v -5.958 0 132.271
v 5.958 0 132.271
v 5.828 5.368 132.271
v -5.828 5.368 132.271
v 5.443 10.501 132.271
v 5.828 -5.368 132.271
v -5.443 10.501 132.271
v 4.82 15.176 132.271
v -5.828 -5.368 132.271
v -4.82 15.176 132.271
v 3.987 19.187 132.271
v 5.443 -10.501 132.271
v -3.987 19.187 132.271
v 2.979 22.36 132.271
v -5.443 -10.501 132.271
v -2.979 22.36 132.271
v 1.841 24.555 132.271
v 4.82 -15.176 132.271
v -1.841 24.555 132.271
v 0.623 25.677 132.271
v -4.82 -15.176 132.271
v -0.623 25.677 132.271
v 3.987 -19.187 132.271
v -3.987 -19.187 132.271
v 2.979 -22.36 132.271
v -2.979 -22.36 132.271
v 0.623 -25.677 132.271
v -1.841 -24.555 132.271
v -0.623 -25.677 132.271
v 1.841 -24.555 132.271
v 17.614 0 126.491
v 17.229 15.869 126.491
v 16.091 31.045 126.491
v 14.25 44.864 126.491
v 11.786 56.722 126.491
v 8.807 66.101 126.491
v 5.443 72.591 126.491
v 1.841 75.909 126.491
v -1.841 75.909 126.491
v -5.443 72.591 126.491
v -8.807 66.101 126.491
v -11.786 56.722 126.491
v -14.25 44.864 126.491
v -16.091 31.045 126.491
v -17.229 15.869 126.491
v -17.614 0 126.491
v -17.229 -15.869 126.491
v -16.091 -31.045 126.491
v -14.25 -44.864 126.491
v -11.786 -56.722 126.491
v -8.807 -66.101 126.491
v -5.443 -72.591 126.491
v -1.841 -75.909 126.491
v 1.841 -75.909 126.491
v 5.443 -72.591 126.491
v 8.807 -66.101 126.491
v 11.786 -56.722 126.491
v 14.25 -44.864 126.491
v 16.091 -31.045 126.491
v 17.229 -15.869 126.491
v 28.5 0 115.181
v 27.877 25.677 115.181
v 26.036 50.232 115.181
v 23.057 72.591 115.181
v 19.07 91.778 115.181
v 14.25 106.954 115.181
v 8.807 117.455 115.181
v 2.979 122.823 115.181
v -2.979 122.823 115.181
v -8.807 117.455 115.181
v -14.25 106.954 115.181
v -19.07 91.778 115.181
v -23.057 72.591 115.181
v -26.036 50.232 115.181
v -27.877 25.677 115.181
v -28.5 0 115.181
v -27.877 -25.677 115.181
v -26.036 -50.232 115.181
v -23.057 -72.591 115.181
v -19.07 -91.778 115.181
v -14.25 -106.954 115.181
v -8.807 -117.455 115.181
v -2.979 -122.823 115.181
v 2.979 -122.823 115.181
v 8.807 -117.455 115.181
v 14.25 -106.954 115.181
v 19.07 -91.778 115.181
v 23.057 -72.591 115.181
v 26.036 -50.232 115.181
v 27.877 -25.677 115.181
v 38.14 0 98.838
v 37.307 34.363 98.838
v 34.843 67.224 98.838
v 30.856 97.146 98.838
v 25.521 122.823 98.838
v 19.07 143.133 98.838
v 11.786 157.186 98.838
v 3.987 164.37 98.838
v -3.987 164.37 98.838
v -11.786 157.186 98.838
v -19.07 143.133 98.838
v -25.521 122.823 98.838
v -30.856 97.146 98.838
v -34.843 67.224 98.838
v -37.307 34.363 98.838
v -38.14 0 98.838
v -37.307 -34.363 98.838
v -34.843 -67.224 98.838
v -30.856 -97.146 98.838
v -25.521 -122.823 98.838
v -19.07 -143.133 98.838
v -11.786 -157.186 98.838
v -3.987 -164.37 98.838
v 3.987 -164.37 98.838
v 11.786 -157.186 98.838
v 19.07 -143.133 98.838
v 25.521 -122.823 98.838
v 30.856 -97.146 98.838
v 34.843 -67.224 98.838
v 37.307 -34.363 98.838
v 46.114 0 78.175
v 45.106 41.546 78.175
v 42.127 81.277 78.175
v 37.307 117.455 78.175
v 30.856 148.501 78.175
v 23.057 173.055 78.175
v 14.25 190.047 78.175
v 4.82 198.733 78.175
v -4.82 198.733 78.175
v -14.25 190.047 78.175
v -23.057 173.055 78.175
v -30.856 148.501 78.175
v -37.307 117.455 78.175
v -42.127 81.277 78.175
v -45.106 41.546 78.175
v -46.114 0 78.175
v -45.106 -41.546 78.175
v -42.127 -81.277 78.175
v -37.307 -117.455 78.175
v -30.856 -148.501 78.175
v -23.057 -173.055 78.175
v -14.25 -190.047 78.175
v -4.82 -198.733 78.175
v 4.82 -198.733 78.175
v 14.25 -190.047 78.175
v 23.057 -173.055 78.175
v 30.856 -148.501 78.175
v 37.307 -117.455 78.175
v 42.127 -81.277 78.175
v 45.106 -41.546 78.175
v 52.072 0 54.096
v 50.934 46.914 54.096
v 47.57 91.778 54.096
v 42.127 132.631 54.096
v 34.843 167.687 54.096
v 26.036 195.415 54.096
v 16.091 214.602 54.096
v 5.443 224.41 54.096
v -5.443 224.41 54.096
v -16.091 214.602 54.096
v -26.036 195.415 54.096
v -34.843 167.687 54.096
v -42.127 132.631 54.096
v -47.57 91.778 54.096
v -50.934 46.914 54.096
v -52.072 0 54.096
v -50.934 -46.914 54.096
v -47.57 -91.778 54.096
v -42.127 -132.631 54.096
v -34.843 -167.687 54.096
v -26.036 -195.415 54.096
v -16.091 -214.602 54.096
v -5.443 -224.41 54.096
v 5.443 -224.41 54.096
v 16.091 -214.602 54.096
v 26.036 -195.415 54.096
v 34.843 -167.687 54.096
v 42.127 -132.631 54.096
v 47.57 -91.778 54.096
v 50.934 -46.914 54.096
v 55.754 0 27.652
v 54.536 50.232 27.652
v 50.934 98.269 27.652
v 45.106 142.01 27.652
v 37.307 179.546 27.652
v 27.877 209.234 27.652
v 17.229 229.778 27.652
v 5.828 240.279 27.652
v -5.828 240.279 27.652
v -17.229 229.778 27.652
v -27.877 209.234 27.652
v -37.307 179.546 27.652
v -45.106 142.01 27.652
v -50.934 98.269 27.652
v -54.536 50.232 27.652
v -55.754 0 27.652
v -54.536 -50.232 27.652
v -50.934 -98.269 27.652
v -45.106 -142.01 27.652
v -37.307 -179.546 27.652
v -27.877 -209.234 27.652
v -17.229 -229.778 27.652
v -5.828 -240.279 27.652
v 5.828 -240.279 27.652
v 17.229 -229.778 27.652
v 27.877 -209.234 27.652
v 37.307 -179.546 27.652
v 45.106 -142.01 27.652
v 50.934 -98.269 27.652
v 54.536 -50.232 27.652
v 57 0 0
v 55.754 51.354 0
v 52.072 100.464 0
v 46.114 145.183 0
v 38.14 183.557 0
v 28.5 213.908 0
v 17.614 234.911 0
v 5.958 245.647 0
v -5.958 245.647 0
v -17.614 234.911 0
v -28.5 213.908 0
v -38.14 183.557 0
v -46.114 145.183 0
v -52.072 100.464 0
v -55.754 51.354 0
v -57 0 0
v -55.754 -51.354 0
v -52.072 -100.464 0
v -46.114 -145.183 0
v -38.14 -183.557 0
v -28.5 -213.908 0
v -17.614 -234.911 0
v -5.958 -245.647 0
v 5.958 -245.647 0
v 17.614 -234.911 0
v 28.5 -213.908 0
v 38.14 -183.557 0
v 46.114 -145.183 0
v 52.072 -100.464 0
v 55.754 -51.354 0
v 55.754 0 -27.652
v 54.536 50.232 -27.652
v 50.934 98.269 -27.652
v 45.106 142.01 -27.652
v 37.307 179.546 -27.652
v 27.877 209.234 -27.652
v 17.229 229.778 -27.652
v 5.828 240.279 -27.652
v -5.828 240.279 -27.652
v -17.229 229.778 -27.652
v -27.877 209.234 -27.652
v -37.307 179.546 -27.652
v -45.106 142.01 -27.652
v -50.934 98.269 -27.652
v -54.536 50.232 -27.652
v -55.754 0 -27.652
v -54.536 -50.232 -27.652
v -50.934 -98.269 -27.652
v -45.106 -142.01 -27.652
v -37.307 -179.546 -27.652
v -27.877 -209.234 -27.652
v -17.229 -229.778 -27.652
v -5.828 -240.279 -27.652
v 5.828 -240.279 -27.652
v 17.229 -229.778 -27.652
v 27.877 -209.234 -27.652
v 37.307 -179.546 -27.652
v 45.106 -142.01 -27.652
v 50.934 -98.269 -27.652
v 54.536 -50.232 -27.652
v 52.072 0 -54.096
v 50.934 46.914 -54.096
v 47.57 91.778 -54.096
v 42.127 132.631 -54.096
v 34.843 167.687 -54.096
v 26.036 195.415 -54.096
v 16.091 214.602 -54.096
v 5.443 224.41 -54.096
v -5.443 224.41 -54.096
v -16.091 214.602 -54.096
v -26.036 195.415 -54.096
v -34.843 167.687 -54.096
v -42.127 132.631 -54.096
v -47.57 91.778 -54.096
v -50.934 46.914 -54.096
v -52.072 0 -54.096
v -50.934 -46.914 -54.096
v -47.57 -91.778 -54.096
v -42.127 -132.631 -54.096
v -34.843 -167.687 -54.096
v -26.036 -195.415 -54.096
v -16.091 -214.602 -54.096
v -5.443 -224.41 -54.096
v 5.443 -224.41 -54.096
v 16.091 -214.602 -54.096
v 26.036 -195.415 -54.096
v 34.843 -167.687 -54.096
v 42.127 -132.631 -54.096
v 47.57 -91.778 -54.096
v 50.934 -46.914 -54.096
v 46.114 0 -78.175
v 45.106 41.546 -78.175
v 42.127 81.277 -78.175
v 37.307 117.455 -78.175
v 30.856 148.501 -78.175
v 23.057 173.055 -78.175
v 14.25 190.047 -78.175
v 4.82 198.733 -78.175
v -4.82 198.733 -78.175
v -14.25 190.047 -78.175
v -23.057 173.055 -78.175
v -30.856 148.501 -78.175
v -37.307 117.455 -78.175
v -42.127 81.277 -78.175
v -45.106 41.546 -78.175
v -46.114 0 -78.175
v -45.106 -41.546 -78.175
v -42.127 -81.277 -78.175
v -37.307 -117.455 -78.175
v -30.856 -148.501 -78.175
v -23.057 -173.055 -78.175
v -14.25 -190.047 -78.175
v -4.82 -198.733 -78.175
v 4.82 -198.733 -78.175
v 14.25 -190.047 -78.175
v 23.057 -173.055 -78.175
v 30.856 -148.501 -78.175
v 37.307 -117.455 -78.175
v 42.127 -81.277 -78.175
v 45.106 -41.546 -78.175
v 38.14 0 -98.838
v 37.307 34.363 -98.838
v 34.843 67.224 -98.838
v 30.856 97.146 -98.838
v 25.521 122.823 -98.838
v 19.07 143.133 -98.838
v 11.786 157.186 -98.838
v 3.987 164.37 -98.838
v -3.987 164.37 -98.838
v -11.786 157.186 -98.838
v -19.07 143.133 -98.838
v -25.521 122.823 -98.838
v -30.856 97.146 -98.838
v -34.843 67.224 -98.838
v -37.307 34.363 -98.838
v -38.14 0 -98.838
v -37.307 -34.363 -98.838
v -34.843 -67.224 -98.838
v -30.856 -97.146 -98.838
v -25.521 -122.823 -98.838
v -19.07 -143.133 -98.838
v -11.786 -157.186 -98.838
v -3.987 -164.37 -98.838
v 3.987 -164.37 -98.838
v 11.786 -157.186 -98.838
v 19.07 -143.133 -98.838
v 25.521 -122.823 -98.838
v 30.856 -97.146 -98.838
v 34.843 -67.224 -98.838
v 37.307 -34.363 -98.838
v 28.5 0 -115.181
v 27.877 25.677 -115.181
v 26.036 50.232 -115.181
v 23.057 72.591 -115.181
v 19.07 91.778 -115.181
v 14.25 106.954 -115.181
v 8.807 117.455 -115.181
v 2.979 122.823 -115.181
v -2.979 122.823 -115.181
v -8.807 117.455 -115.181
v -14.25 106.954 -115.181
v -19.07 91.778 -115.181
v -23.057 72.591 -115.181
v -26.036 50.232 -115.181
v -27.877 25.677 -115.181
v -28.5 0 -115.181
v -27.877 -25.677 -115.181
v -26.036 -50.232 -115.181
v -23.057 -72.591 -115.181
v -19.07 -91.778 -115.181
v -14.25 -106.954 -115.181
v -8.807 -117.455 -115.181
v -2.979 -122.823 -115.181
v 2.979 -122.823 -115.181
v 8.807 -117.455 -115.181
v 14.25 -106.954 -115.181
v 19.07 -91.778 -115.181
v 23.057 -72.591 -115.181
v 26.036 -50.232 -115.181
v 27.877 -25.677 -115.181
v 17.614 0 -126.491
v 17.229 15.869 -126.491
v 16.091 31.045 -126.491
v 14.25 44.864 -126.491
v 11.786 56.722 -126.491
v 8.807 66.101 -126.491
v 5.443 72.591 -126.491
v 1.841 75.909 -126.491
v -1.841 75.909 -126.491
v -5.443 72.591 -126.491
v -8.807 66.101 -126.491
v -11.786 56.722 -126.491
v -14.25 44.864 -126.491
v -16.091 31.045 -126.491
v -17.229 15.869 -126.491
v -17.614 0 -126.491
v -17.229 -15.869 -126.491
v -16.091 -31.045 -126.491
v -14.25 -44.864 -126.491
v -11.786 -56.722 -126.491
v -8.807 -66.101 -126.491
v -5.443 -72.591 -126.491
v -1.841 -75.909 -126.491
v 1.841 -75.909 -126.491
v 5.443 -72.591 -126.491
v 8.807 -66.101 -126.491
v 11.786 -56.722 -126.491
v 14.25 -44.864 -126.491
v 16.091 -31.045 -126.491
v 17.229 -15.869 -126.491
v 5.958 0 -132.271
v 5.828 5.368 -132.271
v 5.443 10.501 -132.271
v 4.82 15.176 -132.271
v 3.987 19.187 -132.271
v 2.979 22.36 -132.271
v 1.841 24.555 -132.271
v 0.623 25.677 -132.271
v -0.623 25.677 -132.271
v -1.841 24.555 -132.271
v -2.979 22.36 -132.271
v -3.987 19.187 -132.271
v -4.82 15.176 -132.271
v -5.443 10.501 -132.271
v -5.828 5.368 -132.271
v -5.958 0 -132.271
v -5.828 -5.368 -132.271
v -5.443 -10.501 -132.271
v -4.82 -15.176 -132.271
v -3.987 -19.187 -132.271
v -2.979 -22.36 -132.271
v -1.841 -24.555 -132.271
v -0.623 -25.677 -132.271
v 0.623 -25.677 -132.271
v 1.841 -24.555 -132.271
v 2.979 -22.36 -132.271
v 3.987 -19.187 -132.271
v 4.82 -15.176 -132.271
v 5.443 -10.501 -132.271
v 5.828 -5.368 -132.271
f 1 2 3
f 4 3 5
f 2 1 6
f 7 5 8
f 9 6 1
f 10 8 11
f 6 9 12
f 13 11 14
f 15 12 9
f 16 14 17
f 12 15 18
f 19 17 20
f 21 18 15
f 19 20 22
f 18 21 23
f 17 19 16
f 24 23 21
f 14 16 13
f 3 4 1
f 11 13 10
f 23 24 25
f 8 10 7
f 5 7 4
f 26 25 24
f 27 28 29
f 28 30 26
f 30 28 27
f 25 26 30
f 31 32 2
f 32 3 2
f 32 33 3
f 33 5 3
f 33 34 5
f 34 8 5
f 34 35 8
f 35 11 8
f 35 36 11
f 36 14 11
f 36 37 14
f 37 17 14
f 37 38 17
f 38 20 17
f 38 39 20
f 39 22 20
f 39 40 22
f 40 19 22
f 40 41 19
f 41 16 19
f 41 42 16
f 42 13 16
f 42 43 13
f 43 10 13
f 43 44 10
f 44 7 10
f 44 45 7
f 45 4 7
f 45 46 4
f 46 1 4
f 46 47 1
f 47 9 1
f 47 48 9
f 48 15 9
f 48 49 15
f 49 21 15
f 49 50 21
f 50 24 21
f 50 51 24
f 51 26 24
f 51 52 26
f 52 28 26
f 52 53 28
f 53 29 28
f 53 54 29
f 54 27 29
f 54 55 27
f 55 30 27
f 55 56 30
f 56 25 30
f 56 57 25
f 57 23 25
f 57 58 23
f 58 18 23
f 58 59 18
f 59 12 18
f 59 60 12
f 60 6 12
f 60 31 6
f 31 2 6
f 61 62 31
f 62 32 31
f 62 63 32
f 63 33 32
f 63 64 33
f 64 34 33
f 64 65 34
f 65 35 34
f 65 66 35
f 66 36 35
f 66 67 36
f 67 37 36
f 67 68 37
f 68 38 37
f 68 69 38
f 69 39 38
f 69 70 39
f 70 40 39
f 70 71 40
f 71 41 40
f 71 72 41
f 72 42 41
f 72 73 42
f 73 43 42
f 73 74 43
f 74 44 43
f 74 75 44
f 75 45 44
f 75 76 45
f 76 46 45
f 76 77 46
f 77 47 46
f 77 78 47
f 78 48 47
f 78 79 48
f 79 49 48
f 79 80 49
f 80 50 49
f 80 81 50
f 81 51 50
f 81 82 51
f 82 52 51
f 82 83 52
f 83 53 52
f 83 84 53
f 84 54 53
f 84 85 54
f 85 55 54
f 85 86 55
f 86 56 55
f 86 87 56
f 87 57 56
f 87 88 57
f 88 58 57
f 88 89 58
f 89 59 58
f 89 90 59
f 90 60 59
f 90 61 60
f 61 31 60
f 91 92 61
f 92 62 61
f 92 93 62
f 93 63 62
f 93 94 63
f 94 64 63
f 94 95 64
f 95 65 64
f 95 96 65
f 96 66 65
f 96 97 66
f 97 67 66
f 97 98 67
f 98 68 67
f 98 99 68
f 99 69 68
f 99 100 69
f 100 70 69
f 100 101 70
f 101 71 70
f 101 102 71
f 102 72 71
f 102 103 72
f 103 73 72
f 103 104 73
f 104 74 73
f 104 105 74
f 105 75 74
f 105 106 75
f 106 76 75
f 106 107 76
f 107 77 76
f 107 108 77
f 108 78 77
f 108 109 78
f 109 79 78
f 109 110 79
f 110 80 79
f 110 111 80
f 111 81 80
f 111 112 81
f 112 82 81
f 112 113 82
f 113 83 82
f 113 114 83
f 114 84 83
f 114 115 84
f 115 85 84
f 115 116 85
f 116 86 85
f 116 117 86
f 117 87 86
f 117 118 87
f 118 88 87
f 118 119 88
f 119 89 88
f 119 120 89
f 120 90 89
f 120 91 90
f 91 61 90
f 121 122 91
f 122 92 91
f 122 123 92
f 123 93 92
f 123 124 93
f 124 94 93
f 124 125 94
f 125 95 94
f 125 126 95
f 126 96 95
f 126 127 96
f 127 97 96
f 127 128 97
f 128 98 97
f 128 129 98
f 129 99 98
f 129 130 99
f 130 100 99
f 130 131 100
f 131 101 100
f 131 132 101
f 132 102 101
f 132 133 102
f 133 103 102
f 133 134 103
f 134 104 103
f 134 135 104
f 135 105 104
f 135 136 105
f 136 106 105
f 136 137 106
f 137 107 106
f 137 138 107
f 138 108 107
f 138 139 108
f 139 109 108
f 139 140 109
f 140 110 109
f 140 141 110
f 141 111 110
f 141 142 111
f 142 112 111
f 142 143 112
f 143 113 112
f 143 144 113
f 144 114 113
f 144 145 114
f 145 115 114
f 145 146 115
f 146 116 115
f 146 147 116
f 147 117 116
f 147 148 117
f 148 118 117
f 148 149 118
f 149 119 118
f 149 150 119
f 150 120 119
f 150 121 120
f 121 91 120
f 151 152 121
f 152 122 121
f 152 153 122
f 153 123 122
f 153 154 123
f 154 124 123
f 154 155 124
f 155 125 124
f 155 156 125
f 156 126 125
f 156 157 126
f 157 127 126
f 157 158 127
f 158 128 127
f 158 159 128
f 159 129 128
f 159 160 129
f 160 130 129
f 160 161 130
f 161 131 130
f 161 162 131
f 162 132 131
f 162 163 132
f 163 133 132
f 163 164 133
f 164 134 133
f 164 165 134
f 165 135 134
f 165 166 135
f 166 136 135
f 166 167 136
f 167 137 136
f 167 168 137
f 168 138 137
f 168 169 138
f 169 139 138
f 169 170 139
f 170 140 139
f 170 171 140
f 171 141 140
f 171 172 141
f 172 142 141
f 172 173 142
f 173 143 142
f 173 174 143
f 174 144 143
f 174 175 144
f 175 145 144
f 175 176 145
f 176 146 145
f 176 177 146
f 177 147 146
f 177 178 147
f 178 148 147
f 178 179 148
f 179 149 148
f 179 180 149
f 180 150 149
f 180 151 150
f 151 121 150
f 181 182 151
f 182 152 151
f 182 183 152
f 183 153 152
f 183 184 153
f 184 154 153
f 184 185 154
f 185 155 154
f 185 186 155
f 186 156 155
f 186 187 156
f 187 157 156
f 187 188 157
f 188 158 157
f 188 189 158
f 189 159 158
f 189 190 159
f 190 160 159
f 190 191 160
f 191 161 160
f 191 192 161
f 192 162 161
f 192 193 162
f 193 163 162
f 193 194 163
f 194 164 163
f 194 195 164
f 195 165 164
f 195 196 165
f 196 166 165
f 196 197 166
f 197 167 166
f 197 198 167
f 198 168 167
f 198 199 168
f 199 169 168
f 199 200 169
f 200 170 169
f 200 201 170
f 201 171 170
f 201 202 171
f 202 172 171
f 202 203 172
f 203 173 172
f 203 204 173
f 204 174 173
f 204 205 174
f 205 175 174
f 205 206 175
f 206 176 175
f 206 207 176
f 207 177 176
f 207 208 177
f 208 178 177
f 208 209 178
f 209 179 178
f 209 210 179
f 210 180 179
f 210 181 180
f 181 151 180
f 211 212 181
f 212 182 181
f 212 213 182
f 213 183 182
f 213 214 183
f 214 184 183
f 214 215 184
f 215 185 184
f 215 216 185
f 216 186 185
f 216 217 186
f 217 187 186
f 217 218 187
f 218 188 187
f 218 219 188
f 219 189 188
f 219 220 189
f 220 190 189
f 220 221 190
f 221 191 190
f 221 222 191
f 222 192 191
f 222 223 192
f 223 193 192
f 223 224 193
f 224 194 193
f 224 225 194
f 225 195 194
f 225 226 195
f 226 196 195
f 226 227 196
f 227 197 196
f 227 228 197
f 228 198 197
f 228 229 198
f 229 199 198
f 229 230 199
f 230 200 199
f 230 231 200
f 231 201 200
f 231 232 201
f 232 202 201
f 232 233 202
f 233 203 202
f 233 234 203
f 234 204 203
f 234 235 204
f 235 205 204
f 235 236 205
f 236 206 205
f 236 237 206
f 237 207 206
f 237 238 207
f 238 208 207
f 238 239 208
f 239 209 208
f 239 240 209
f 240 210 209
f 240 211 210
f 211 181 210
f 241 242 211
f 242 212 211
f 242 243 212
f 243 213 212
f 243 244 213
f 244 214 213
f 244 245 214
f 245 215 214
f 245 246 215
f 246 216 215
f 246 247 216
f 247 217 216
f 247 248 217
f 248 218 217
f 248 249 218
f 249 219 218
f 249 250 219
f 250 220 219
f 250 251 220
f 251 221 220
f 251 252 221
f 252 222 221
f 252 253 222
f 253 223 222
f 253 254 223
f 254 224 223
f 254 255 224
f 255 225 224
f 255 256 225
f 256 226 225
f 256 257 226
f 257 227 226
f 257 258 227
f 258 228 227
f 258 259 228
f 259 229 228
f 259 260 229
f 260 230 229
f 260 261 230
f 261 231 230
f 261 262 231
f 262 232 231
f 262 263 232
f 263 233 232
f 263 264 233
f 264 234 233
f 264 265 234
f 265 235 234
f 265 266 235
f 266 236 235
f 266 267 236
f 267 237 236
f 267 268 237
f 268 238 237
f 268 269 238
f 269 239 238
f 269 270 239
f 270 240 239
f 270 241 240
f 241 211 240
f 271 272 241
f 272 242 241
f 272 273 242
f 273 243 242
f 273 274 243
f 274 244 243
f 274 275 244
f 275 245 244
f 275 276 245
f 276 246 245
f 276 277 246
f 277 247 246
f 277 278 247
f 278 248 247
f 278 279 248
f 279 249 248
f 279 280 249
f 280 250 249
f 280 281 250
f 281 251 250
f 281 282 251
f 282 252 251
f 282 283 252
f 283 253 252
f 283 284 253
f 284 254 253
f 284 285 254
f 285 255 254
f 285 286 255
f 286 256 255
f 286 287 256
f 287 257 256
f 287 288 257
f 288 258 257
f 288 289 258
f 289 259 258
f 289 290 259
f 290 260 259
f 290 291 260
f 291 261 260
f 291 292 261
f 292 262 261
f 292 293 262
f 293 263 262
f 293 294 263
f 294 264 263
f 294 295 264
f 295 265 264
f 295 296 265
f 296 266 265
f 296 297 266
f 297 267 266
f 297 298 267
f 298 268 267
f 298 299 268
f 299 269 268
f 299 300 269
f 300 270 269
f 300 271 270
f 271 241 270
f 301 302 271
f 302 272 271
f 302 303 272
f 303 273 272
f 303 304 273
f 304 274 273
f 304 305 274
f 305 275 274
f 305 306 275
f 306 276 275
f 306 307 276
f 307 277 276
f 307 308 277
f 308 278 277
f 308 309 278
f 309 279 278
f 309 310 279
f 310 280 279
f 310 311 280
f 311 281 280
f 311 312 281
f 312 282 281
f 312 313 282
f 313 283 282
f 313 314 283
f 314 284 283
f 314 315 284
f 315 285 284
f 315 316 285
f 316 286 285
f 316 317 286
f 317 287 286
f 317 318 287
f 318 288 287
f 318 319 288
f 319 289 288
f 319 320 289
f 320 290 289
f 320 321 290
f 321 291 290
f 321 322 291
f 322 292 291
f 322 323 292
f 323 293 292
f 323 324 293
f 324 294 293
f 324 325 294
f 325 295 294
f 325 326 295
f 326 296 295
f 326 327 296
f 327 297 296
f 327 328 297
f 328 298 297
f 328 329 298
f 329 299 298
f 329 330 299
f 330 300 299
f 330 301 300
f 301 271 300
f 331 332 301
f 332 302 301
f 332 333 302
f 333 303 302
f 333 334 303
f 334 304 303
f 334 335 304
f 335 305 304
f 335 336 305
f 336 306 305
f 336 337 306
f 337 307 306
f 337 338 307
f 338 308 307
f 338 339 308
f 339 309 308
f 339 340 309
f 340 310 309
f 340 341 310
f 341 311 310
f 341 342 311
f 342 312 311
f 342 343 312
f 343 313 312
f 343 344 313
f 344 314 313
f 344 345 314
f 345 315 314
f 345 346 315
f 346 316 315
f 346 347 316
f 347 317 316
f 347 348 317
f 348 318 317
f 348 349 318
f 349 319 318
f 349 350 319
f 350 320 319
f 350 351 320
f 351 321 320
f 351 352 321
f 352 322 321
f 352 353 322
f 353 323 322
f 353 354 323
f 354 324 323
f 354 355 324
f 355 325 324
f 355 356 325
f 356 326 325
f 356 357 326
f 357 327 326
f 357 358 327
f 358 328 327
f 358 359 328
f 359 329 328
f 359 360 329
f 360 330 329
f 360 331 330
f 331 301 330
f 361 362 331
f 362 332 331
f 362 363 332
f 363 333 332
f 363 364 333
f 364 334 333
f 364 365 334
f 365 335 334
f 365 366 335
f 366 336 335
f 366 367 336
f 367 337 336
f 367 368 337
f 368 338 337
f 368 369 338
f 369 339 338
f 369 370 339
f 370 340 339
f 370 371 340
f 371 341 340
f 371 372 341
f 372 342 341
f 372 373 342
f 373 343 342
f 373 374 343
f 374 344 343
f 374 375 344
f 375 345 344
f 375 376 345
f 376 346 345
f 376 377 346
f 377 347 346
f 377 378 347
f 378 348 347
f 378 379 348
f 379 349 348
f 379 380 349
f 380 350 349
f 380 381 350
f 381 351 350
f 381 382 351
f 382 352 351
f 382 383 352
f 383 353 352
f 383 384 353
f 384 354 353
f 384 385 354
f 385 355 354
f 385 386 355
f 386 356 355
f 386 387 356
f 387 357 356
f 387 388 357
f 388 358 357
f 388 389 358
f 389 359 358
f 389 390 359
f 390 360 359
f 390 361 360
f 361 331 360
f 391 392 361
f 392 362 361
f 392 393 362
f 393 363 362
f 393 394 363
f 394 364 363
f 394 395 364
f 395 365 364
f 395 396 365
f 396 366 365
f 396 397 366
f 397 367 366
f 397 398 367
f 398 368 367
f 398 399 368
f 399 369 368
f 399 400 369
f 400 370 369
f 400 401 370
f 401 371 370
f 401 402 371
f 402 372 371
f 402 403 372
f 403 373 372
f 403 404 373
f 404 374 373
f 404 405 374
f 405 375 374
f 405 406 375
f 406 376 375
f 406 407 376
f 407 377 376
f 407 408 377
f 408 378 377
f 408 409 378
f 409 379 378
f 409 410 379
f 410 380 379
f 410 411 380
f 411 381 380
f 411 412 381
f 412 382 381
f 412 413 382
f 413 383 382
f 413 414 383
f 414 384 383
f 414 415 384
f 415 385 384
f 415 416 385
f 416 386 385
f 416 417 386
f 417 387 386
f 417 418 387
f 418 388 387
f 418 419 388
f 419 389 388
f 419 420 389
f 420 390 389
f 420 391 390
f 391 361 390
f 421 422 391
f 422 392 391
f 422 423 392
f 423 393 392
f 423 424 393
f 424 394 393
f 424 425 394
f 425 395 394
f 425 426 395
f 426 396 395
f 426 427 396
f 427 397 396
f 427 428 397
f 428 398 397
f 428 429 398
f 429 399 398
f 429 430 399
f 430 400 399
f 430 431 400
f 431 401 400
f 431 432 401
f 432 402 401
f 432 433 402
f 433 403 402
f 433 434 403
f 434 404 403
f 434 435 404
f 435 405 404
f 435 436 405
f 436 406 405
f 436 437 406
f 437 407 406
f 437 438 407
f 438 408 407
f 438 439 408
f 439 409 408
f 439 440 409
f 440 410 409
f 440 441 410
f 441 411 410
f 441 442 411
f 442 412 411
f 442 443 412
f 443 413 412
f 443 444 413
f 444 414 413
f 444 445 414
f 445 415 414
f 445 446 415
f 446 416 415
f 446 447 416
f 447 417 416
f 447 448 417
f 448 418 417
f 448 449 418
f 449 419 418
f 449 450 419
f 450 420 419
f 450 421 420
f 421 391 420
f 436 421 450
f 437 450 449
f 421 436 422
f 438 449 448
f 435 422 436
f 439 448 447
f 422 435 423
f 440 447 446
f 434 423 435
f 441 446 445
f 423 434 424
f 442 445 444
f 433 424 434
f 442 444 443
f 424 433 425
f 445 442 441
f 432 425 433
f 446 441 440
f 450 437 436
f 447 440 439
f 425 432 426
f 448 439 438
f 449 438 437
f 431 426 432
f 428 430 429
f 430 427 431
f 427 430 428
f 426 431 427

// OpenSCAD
// Generated by SolidPython 1.0.1 on 2020-07-29 00:46:45


scale(v = [3, 13, 7]) {
	sphere(r = 19);
}
/***********************************************
*********      SolidPython code:      **********
************************************************
 
# import packages: SolidPython
from solid import *
from solid.utils import *
from itertools import chain, combinations, permutations


class Resize:

    def __init__(self, scad_file):
        self.scad_file = scad_file
        #self.scad_file = import_scad(scad_file)
        # cone/cylinder param:
        self.r1 = 0
        self.r2 = 0
        self.h = 0
        # rectangular prism param:
        self.w = 0
        self.l = 0
        # ellipse param:
        self.r = 0

    # import OpenScad code (file name corresponds to shape)


    # classify shape + parameters
    def assign(self, param1, param2, param3):
        if self.scad_file == 'cone.scad':
            self.r1 = param1
            self.r2 = param2
            self.h = param3
        elif self.scad_file == 'cylinder.scad':
            self.r1 = param1
            self.r2 = param2
            self.h = param3
        elif self.scad_file == 'rectangularPrism.scad':
            self.h = param1
            self.l = param2
            self.w = param3
        else:
            self.r = param1
            self.h = param2

    # resize parameters
    def iterate(self):
        x = range(3, 20, 2)
        i = 1
        if self.scad_file == 'cone.scad':
            tempList = list(permutations(x, 2))
            for temp in tempList:
                param1 = temp[0]
                param2 = temp[1]
                filepath = 'produced_scad_files/' + 'cone' + str(param1) + '_' + str(param2) + '_' + '.scad'
                scad_render_to_file(cylinder(h=param1, r1=param2, r2=0), filepath)

        elif self.scad_file == 'cylinder.scad':
            tempList = list(permutations(x, 3))
            for temp in tempList:
                param1 = temp[0]
                param2 = temp[1]
                filepath = 'produced_scad_files/' + 'cylinder' + str(param1) + '_' + str(param2) + '_' + '.scad'
                scad_render_to_file(cylinder(h=param1, r1=param2, r2=param2), filepath)

        elif self.scad_file == 'rectangularPrism.scad':
            tempList = list(permutations(x, 3))
            for temp in tempList:
                param1 = temp[0]
                param2 = temp[1]
                param3 = temp[2]
                filepath = 'produced_scad_files/' + 'rectangularPrism' + str(param1) + '_' + str(param2) + '_' + str(
                    param3) + '.scad'
                scad_render_to_file(cube(size=(param1, param2, param3)), filepath)

        elif self.scad_file == 'ellipse.scad':
            tempList = list(permutations(x, 4))
            for temp in tempList:
                param1 = temp[0]
                param2 = temp[1]
                param3 = temp[2]
                param4 = temp[3]
                filepath = 'produced_scad_files/' + 'ellipse' + str(param1) + '_' + str(param2) + '_' + str(param3) + '_' + str(param4) + '.scad'
                scad_render_to_file(scale([param1, param2, param3])(sphere(r=param4)), filepath)

    def render_to_scadfile(self):
        scad_render_to_file(scad, 'example.scad') 
 
************************************************/
